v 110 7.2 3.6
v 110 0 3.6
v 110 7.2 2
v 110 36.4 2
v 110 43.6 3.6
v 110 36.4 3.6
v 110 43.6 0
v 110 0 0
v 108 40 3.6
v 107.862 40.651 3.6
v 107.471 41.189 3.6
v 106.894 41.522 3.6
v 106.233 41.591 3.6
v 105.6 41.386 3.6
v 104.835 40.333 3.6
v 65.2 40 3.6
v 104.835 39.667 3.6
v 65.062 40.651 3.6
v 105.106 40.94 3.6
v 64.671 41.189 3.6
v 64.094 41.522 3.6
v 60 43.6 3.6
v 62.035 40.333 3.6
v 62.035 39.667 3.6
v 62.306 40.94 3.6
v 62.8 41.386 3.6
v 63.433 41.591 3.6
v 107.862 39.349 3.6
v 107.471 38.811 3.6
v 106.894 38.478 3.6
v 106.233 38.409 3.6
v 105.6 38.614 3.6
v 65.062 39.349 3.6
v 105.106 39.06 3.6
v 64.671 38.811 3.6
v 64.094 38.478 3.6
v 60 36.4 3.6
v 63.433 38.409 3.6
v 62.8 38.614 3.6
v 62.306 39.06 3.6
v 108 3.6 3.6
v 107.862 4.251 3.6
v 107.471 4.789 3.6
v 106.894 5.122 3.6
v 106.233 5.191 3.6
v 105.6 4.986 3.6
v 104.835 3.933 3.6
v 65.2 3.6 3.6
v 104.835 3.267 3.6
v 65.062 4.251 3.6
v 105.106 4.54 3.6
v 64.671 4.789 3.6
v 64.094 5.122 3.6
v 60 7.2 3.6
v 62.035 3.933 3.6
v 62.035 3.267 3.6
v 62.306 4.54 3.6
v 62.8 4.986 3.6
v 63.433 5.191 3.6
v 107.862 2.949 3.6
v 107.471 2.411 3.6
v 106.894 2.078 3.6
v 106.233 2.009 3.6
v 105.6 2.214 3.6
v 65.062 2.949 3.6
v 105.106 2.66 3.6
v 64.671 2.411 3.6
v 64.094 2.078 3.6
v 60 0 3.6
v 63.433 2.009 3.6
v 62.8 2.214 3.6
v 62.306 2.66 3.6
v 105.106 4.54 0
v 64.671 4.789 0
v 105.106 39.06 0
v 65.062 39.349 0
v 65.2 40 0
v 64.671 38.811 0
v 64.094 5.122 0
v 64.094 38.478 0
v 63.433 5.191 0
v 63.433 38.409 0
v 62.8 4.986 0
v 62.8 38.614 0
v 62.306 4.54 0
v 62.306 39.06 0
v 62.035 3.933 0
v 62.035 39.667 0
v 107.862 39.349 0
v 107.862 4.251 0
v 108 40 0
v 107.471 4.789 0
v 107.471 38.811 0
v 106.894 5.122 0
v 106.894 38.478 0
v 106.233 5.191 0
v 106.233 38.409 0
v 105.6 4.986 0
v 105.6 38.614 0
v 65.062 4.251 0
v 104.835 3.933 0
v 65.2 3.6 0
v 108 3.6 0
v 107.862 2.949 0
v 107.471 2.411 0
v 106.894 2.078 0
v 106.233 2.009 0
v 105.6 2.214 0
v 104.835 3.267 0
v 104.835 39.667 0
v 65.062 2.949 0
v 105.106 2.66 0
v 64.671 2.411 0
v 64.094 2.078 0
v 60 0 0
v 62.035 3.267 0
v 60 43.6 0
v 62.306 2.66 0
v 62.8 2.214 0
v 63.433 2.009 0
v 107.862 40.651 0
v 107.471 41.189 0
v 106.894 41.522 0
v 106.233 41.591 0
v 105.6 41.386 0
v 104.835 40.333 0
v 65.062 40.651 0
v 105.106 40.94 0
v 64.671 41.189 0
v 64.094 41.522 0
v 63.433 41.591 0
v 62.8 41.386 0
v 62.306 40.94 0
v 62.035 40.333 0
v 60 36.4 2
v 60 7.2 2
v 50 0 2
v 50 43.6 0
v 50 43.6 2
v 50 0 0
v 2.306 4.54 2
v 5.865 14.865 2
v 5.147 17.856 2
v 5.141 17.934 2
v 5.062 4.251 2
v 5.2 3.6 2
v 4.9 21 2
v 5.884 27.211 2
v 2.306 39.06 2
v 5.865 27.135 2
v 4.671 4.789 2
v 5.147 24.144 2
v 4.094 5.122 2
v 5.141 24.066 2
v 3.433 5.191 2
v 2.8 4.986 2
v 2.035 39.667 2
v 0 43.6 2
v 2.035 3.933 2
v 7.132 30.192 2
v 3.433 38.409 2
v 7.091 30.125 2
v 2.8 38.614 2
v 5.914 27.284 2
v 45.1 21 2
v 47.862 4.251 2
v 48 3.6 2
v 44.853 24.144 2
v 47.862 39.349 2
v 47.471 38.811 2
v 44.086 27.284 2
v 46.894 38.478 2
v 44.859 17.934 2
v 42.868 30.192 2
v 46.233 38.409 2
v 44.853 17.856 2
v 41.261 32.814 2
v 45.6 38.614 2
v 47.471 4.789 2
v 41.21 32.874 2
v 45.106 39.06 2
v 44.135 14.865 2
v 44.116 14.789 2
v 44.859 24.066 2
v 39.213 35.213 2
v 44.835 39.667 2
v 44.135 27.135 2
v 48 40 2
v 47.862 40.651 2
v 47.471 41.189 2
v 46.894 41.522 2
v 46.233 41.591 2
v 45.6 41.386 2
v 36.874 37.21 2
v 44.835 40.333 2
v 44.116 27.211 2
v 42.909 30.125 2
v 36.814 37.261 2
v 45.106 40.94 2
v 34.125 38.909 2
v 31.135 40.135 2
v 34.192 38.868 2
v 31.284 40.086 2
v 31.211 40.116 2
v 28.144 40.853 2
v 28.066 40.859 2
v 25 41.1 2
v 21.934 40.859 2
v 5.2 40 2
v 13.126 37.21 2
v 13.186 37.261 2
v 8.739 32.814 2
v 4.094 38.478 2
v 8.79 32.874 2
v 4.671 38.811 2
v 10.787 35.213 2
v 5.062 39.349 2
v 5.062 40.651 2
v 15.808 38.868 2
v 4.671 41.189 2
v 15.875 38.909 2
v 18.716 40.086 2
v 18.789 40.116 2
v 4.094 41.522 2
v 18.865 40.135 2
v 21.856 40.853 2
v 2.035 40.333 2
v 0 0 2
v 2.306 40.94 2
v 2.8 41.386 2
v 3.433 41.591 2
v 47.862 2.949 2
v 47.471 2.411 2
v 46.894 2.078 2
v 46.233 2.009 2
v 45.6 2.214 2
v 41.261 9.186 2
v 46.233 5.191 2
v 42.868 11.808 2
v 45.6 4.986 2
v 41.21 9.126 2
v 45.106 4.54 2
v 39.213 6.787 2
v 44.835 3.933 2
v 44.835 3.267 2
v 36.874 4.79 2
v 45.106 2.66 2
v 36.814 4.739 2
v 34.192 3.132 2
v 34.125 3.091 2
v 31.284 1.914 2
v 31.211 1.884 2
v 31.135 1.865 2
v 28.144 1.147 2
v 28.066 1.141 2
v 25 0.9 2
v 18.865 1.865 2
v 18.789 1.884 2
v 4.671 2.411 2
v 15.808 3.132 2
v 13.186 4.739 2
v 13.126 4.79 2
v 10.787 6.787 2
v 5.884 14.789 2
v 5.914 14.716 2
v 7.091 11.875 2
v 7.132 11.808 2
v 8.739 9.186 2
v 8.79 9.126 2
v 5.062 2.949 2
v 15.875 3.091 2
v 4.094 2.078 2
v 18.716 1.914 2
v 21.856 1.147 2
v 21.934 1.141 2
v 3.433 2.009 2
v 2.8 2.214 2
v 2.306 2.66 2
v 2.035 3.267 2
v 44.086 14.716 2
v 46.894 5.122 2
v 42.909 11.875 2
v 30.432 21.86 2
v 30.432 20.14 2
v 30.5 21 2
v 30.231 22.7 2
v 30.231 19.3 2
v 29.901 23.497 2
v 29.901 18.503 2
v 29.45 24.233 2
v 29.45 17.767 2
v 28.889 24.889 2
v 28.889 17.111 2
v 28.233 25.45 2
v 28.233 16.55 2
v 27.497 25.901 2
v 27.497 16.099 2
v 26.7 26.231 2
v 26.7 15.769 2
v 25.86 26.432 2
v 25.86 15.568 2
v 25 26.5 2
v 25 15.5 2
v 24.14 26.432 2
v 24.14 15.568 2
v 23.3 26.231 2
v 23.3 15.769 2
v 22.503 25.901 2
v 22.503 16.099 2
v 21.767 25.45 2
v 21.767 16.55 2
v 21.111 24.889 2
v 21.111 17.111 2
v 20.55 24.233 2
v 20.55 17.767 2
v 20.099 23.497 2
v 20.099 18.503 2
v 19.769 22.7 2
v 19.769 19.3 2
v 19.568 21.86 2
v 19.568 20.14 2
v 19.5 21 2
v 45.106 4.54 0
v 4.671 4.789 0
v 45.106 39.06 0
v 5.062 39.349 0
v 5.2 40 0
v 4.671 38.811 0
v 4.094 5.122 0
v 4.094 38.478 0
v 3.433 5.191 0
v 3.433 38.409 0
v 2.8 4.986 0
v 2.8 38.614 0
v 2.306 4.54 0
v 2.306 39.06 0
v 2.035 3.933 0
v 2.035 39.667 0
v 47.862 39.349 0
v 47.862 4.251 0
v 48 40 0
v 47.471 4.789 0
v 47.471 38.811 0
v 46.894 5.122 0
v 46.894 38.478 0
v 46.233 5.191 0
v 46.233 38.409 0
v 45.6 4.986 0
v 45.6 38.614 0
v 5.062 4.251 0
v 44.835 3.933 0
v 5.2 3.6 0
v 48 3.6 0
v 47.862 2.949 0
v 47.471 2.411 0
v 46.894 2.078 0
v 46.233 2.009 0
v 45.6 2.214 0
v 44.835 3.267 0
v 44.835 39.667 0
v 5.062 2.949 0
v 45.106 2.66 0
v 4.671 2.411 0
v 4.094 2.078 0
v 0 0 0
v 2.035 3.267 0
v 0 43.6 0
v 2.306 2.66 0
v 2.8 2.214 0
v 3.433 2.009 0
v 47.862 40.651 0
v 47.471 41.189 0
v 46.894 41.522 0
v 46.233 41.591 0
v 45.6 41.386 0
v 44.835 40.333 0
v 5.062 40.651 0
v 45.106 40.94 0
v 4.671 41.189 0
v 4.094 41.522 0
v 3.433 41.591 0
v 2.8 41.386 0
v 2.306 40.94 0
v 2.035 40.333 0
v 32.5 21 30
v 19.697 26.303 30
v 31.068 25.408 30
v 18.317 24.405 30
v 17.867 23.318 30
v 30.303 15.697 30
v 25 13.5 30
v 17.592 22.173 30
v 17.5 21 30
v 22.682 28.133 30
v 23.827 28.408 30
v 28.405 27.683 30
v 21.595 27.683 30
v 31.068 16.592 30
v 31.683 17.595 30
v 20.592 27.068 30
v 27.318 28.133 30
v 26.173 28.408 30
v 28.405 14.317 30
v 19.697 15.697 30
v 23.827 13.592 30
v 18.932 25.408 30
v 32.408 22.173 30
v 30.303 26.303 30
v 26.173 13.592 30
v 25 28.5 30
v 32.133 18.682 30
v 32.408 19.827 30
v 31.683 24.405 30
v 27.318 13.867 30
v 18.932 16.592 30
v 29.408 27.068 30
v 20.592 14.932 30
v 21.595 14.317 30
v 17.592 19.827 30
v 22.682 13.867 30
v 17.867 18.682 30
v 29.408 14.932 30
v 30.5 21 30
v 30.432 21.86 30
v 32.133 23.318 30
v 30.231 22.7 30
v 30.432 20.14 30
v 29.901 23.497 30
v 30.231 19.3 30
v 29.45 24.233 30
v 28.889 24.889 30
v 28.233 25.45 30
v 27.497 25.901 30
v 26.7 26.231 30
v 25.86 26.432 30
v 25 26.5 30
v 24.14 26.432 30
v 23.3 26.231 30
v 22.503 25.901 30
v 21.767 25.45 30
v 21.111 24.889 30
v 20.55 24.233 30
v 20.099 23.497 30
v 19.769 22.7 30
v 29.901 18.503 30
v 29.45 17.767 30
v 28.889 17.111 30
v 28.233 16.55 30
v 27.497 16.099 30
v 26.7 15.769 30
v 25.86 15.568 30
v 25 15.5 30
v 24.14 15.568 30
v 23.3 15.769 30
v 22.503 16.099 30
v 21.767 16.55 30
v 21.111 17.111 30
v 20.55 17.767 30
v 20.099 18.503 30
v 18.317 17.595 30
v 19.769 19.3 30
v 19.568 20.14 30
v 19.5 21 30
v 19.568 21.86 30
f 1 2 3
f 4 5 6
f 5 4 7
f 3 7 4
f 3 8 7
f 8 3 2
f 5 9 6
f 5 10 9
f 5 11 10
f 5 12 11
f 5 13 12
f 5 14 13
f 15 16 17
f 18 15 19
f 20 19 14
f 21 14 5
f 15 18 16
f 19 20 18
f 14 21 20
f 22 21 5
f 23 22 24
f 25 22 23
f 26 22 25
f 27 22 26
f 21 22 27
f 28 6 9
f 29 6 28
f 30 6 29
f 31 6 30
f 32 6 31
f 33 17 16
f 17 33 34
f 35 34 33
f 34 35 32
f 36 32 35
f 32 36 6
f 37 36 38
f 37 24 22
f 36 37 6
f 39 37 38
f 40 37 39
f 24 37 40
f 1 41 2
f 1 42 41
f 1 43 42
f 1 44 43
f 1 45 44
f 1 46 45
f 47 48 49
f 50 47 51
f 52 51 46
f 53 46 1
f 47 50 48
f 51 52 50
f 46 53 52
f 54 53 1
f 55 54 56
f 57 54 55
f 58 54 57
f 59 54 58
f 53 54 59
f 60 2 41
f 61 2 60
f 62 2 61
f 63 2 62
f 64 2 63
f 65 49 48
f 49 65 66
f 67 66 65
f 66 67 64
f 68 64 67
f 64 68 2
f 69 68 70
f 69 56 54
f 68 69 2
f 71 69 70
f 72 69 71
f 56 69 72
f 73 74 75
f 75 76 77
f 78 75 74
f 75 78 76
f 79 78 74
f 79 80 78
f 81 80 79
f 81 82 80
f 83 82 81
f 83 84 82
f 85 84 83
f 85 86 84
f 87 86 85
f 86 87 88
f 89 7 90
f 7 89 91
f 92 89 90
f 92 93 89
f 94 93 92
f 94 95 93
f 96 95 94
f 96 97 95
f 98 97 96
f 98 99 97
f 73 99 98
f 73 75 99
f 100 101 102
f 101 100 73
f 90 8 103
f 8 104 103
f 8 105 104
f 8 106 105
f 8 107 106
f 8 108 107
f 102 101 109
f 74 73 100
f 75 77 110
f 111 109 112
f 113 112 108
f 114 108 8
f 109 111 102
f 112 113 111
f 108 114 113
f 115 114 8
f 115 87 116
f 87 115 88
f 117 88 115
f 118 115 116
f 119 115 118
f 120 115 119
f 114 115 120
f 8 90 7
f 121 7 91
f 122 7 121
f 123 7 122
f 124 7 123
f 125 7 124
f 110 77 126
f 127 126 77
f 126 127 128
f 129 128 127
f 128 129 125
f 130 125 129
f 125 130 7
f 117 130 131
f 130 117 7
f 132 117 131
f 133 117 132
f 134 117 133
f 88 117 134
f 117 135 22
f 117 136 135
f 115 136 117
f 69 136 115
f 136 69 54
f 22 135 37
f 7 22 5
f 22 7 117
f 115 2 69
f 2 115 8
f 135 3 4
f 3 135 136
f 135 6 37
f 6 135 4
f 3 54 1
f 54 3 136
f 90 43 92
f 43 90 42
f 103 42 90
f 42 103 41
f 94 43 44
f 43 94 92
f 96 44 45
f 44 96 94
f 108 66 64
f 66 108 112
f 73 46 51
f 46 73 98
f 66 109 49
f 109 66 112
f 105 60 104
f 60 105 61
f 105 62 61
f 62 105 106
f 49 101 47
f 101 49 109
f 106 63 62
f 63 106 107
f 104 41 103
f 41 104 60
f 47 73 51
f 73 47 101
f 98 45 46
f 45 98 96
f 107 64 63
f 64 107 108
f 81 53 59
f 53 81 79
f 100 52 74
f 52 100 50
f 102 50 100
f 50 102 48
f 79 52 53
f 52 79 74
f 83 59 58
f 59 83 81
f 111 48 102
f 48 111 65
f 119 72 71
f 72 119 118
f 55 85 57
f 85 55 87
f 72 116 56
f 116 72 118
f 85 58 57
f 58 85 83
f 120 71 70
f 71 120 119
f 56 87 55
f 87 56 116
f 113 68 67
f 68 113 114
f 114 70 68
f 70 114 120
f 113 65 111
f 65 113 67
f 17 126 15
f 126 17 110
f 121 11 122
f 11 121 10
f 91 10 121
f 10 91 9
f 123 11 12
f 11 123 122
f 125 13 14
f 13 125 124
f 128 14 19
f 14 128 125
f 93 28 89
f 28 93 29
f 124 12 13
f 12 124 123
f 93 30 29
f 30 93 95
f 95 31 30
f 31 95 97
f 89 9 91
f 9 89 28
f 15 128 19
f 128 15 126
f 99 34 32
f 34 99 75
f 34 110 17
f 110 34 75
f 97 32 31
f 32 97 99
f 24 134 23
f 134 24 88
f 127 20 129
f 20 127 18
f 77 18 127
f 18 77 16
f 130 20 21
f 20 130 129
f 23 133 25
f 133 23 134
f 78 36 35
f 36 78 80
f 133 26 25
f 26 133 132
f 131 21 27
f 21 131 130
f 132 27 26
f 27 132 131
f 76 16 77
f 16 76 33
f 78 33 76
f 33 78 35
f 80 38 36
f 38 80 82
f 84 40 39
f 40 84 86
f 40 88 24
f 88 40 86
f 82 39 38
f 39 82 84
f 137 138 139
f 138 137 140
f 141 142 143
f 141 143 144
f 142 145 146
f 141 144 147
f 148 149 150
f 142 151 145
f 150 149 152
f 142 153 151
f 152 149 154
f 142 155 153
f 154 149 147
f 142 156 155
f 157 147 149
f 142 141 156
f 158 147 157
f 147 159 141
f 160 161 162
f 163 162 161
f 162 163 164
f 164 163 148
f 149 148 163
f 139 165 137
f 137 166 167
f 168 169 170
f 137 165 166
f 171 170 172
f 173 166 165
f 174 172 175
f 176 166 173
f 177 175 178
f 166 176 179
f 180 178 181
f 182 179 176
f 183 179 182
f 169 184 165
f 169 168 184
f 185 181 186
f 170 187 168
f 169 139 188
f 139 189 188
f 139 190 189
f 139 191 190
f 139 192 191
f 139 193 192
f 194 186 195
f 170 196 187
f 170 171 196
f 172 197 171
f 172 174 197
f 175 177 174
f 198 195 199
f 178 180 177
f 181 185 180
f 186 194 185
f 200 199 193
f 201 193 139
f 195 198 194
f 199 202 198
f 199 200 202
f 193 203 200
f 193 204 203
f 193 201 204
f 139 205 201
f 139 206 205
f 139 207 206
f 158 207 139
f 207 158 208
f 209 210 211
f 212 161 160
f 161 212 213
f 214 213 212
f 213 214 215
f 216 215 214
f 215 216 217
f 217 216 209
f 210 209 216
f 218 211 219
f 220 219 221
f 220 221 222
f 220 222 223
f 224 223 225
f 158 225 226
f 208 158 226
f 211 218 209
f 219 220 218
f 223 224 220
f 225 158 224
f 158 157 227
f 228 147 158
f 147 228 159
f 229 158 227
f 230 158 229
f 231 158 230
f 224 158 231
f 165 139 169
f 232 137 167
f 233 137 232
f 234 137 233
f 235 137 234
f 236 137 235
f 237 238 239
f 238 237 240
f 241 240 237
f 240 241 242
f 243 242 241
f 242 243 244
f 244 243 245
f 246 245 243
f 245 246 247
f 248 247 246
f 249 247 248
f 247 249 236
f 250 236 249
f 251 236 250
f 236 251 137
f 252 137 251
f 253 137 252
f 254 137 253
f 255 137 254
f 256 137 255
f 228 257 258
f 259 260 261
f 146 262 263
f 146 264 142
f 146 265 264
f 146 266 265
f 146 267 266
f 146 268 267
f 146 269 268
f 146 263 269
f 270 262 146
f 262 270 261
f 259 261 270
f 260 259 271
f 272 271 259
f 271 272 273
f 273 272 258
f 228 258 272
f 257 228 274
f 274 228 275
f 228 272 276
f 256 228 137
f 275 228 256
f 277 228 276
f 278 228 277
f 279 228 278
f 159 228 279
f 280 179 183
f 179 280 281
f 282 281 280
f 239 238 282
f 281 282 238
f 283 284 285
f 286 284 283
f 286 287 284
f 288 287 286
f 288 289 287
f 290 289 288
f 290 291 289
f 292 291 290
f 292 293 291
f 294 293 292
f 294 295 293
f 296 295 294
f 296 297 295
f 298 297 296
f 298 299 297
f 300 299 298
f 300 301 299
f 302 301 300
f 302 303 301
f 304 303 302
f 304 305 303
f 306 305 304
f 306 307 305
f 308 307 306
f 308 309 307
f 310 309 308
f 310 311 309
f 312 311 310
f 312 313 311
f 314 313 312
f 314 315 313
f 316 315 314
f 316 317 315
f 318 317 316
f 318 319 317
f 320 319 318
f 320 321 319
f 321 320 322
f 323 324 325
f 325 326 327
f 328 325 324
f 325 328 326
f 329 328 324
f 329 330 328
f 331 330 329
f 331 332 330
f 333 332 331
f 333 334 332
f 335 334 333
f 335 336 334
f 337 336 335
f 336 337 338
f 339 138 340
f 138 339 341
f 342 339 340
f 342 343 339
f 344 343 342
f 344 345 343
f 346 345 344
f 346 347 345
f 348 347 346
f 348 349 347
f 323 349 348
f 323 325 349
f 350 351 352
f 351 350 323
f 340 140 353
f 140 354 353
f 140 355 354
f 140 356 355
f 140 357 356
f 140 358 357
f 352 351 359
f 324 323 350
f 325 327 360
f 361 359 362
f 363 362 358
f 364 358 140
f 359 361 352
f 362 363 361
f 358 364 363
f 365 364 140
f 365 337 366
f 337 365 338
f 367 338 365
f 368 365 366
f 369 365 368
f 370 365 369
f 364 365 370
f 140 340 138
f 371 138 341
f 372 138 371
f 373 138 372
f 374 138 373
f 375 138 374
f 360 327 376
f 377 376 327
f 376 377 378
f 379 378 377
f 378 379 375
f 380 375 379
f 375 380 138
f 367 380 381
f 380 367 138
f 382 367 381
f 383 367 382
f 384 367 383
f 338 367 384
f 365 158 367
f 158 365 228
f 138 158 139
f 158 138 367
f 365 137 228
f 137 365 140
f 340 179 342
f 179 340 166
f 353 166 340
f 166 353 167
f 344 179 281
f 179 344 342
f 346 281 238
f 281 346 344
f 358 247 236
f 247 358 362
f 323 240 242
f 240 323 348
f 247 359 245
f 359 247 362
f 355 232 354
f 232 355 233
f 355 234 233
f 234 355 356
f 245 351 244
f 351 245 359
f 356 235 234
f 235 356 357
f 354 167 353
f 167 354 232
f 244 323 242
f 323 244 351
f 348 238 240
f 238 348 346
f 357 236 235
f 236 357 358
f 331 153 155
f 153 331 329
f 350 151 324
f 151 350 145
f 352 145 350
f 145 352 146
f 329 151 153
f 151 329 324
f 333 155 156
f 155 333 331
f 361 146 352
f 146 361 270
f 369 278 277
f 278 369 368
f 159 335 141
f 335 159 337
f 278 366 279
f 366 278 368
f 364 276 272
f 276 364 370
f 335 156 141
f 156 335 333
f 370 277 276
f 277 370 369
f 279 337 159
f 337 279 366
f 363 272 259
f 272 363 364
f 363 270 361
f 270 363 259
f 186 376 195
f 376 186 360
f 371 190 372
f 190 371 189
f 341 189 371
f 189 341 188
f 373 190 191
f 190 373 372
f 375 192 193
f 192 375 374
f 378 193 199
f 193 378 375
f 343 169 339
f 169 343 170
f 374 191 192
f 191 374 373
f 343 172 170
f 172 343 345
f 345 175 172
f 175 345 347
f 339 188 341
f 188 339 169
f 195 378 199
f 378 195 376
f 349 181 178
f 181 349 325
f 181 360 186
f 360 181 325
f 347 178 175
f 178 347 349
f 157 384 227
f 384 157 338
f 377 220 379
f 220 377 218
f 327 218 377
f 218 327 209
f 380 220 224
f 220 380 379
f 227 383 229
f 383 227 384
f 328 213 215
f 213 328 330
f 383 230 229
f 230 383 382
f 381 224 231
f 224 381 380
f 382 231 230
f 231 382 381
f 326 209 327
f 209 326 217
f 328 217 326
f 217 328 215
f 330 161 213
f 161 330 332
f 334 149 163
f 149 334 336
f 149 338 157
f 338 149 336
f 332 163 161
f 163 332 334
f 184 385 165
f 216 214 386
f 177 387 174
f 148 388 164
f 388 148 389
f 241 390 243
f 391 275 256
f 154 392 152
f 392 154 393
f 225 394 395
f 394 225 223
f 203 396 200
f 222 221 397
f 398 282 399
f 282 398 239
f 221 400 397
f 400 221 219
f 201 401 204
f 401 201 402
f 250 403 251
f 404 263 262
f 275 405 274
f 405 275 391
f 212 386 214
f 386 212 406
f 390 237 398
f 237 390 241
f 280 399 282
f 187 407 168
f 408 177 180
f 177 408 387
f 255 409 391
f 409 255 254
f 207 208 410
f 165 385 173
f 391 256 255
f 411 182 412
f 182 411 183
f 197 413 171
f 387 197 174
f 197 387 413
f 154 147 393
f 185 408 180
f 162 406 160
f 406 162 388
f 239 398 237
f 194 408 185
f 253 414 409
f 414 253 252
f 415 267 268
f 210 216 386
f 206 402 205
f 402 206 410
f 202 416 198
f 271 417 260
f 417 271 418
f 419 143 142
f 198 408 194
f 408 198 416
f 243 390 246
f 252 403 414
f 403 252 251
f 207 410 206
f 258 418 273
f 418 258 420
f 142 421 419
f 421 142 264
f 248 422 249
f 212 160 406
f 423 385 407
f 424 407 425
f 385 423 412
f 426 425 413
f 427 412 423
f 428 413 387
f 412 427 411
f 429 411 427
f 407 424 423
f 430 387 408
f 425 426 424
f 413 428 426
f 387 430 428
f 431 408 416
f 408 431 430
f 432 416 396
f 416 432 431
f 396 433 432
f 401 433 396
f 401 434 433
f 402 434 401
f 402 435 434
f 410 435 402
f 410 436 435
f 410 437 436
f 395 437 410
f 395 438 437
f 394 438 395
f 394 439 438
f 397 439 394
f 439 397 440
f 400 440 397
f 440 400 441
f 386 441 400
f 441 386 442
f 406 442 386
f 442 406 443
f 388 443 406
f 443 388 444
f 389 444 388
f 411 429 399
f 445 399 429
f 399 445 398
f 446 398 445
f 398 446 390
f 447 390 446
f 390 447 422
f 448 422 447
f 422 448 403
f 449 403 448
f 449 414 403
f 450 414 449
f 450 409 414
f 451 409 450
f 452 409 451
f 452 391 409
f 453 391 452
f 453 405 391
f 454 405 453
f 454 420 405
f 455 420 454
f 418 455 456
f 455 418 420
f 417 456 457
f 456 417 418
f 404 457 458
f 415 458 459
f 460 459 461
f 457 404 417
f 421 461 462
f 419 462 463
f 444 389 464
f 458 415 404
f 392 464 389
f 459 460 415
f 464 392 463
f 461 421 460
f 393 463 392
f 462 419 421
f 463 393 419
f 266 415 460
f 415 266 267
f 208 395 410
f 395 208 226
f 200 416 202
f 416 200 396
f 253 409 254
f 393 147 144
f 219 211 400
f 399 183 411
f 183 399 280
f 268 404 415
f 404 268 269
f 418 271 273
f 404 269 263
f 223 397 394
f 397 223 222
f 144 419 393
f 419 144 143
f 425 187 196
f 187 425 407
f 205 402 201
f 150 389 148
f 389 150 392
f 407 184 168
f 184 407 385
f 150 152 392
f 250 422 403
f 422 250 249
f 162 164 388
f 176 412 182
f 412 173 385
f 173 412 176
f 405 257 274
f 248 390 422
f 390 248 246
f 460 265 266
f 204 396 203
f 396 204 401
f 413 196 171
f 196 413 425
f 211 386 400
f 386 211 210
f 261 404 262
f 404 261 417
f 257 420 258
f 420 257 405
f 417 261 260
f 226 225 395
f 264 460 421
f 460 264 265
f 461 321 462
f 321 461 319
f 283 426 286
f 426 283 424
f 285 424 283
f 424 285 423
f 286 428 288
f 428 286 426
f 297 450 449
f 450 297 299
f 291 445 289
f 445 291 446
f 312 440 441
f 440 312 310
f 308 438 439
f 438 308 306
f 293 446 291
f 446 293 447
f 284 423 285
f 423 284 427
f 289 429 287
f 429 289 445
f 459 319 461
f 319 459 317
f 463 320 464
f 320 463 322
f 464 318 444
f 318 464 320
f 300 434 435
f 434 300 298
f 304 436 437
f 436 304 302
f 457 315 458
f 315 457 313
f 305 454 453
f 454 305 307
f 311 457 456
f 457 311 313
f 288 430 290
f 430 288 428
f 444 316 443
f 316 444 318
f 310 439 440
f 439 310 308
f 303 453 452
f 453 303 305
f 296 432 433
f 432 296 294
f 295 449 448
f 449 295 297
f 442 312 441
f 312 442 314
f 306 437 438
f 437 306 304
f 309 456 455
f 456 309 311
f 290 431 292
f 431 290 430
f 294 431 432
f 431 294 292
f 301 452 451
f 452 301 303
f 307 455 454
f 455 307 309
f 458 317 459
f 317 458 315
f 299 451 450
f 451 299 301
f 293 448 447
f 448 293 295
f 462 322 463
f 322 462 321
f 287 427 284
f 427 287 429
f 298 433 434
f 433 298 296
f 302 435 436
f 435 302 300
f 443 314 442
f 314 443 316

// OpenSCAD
$_plateLenght = 50;
$_plateWidth = 29.2;
$_plateHeight = 2;
$_plateBaseHeight = 1.6;

$_poleDia = 11;
$_poleMountHeight = 30;
$_poleClearanceTop = 4;
$_poleClearanceBot = 31;

$_boltDia = 3.2;
$_boltClearance = 2;

module bolt(){
  cylinder(d=$_boltDia,$_plateHeight*3,$fn=15);  
}

module bottomPlate(){
    difference(){
        cube([  $_plateLenght,
                $_plateWidth + $_boltDia * 2 + $_boltClearance * 4,
                $_plateHeight + $_plateBaseHeight]);    //Main plate

        translate([ 0,
                    $_boltDia + $_boltClearance * 2,
                    $_plateHeight])
                    cube([  $_plateLenght,
                            $_plateWidth,
                            $_plateHeight]);
    
        translate([ $_plateLenght - ($_boltDia / 2 + $_boltClearance),
                    0 + ($_boltDia / 2 + $_boltClearance),
                    0]) bolt();

        translate([ 0 + ($_boltDia / 2 + $_boltClearance),
                    0 + ($_boltDia / 2 + $_boltClearance),
                    0]) bolt();
            
        translate([ $_plateLenght - ($_boltDia / 2 + $_boltClearance),
                    $_plateWidth + $_boltDia + $_boltClearance * 2 + ($_boltDia / 2 + $_boltClearance),
                    0]) bolt();

        translate([ 0 + ($_boltDia / 2 + $_boltClearance),
                    $_plateWidth + $_boltDia + $_boltClearance * 2 + ($_boltDia / 2 + $_boltClearance),
                    0]) bolt();
    }

    

}

module topPlate(){
    difference(){
        cube([  $_plateLenght,
                $_plateWidth + $_boltDia * 2 + $_boltClearance * 4,
                $_plateHeight]);    //Main plate

    
    translate([ $_plateLenght - ($_boltDia / 2 + $_boltClearance),
                0 + ($_boltDia / 2 + $_boltClearance),
                0]) bolt();

    translate([ 0 + ($_boltDia / 2 + $_boltClearance),
                0 + ($_boltDia / 2 + $_boltClearance),
                0]) bolt();
        
    translate([ $_plateLenght - ($_boltDia / 2 + $_boltClearance),
                $_plateWidth + $_boltDia + $_boltClearance * 2 + ($_boltDia / 2 + $_boltClearance),
                0]) bolt();

    translate([ 0 + ($_boltDia / 2 + $_boltClearance),
                $_plateWidth + $_boltDia + $_boltClearance * 2 + ($_boltDia / 2 + $_boltClearance),
                0]) bolt();
    }
    
    
    translate([$_plateLenght/2,$_plateWidth/2 + $_boltDia * 2 ,0])    
    difference(){
        cylinder(d1=$_poleDia + $_poleClearanceBot, d2=$_poleDia + $_poleClearanceTop, $_poleMountHeight, $fn=40);
        cylinder(d=$_poleDia, $_poleMountHeight, $fn=40);
    }
}



translate([$_plateLenght + 10,0,0])bottomPlate();
topPlate();
